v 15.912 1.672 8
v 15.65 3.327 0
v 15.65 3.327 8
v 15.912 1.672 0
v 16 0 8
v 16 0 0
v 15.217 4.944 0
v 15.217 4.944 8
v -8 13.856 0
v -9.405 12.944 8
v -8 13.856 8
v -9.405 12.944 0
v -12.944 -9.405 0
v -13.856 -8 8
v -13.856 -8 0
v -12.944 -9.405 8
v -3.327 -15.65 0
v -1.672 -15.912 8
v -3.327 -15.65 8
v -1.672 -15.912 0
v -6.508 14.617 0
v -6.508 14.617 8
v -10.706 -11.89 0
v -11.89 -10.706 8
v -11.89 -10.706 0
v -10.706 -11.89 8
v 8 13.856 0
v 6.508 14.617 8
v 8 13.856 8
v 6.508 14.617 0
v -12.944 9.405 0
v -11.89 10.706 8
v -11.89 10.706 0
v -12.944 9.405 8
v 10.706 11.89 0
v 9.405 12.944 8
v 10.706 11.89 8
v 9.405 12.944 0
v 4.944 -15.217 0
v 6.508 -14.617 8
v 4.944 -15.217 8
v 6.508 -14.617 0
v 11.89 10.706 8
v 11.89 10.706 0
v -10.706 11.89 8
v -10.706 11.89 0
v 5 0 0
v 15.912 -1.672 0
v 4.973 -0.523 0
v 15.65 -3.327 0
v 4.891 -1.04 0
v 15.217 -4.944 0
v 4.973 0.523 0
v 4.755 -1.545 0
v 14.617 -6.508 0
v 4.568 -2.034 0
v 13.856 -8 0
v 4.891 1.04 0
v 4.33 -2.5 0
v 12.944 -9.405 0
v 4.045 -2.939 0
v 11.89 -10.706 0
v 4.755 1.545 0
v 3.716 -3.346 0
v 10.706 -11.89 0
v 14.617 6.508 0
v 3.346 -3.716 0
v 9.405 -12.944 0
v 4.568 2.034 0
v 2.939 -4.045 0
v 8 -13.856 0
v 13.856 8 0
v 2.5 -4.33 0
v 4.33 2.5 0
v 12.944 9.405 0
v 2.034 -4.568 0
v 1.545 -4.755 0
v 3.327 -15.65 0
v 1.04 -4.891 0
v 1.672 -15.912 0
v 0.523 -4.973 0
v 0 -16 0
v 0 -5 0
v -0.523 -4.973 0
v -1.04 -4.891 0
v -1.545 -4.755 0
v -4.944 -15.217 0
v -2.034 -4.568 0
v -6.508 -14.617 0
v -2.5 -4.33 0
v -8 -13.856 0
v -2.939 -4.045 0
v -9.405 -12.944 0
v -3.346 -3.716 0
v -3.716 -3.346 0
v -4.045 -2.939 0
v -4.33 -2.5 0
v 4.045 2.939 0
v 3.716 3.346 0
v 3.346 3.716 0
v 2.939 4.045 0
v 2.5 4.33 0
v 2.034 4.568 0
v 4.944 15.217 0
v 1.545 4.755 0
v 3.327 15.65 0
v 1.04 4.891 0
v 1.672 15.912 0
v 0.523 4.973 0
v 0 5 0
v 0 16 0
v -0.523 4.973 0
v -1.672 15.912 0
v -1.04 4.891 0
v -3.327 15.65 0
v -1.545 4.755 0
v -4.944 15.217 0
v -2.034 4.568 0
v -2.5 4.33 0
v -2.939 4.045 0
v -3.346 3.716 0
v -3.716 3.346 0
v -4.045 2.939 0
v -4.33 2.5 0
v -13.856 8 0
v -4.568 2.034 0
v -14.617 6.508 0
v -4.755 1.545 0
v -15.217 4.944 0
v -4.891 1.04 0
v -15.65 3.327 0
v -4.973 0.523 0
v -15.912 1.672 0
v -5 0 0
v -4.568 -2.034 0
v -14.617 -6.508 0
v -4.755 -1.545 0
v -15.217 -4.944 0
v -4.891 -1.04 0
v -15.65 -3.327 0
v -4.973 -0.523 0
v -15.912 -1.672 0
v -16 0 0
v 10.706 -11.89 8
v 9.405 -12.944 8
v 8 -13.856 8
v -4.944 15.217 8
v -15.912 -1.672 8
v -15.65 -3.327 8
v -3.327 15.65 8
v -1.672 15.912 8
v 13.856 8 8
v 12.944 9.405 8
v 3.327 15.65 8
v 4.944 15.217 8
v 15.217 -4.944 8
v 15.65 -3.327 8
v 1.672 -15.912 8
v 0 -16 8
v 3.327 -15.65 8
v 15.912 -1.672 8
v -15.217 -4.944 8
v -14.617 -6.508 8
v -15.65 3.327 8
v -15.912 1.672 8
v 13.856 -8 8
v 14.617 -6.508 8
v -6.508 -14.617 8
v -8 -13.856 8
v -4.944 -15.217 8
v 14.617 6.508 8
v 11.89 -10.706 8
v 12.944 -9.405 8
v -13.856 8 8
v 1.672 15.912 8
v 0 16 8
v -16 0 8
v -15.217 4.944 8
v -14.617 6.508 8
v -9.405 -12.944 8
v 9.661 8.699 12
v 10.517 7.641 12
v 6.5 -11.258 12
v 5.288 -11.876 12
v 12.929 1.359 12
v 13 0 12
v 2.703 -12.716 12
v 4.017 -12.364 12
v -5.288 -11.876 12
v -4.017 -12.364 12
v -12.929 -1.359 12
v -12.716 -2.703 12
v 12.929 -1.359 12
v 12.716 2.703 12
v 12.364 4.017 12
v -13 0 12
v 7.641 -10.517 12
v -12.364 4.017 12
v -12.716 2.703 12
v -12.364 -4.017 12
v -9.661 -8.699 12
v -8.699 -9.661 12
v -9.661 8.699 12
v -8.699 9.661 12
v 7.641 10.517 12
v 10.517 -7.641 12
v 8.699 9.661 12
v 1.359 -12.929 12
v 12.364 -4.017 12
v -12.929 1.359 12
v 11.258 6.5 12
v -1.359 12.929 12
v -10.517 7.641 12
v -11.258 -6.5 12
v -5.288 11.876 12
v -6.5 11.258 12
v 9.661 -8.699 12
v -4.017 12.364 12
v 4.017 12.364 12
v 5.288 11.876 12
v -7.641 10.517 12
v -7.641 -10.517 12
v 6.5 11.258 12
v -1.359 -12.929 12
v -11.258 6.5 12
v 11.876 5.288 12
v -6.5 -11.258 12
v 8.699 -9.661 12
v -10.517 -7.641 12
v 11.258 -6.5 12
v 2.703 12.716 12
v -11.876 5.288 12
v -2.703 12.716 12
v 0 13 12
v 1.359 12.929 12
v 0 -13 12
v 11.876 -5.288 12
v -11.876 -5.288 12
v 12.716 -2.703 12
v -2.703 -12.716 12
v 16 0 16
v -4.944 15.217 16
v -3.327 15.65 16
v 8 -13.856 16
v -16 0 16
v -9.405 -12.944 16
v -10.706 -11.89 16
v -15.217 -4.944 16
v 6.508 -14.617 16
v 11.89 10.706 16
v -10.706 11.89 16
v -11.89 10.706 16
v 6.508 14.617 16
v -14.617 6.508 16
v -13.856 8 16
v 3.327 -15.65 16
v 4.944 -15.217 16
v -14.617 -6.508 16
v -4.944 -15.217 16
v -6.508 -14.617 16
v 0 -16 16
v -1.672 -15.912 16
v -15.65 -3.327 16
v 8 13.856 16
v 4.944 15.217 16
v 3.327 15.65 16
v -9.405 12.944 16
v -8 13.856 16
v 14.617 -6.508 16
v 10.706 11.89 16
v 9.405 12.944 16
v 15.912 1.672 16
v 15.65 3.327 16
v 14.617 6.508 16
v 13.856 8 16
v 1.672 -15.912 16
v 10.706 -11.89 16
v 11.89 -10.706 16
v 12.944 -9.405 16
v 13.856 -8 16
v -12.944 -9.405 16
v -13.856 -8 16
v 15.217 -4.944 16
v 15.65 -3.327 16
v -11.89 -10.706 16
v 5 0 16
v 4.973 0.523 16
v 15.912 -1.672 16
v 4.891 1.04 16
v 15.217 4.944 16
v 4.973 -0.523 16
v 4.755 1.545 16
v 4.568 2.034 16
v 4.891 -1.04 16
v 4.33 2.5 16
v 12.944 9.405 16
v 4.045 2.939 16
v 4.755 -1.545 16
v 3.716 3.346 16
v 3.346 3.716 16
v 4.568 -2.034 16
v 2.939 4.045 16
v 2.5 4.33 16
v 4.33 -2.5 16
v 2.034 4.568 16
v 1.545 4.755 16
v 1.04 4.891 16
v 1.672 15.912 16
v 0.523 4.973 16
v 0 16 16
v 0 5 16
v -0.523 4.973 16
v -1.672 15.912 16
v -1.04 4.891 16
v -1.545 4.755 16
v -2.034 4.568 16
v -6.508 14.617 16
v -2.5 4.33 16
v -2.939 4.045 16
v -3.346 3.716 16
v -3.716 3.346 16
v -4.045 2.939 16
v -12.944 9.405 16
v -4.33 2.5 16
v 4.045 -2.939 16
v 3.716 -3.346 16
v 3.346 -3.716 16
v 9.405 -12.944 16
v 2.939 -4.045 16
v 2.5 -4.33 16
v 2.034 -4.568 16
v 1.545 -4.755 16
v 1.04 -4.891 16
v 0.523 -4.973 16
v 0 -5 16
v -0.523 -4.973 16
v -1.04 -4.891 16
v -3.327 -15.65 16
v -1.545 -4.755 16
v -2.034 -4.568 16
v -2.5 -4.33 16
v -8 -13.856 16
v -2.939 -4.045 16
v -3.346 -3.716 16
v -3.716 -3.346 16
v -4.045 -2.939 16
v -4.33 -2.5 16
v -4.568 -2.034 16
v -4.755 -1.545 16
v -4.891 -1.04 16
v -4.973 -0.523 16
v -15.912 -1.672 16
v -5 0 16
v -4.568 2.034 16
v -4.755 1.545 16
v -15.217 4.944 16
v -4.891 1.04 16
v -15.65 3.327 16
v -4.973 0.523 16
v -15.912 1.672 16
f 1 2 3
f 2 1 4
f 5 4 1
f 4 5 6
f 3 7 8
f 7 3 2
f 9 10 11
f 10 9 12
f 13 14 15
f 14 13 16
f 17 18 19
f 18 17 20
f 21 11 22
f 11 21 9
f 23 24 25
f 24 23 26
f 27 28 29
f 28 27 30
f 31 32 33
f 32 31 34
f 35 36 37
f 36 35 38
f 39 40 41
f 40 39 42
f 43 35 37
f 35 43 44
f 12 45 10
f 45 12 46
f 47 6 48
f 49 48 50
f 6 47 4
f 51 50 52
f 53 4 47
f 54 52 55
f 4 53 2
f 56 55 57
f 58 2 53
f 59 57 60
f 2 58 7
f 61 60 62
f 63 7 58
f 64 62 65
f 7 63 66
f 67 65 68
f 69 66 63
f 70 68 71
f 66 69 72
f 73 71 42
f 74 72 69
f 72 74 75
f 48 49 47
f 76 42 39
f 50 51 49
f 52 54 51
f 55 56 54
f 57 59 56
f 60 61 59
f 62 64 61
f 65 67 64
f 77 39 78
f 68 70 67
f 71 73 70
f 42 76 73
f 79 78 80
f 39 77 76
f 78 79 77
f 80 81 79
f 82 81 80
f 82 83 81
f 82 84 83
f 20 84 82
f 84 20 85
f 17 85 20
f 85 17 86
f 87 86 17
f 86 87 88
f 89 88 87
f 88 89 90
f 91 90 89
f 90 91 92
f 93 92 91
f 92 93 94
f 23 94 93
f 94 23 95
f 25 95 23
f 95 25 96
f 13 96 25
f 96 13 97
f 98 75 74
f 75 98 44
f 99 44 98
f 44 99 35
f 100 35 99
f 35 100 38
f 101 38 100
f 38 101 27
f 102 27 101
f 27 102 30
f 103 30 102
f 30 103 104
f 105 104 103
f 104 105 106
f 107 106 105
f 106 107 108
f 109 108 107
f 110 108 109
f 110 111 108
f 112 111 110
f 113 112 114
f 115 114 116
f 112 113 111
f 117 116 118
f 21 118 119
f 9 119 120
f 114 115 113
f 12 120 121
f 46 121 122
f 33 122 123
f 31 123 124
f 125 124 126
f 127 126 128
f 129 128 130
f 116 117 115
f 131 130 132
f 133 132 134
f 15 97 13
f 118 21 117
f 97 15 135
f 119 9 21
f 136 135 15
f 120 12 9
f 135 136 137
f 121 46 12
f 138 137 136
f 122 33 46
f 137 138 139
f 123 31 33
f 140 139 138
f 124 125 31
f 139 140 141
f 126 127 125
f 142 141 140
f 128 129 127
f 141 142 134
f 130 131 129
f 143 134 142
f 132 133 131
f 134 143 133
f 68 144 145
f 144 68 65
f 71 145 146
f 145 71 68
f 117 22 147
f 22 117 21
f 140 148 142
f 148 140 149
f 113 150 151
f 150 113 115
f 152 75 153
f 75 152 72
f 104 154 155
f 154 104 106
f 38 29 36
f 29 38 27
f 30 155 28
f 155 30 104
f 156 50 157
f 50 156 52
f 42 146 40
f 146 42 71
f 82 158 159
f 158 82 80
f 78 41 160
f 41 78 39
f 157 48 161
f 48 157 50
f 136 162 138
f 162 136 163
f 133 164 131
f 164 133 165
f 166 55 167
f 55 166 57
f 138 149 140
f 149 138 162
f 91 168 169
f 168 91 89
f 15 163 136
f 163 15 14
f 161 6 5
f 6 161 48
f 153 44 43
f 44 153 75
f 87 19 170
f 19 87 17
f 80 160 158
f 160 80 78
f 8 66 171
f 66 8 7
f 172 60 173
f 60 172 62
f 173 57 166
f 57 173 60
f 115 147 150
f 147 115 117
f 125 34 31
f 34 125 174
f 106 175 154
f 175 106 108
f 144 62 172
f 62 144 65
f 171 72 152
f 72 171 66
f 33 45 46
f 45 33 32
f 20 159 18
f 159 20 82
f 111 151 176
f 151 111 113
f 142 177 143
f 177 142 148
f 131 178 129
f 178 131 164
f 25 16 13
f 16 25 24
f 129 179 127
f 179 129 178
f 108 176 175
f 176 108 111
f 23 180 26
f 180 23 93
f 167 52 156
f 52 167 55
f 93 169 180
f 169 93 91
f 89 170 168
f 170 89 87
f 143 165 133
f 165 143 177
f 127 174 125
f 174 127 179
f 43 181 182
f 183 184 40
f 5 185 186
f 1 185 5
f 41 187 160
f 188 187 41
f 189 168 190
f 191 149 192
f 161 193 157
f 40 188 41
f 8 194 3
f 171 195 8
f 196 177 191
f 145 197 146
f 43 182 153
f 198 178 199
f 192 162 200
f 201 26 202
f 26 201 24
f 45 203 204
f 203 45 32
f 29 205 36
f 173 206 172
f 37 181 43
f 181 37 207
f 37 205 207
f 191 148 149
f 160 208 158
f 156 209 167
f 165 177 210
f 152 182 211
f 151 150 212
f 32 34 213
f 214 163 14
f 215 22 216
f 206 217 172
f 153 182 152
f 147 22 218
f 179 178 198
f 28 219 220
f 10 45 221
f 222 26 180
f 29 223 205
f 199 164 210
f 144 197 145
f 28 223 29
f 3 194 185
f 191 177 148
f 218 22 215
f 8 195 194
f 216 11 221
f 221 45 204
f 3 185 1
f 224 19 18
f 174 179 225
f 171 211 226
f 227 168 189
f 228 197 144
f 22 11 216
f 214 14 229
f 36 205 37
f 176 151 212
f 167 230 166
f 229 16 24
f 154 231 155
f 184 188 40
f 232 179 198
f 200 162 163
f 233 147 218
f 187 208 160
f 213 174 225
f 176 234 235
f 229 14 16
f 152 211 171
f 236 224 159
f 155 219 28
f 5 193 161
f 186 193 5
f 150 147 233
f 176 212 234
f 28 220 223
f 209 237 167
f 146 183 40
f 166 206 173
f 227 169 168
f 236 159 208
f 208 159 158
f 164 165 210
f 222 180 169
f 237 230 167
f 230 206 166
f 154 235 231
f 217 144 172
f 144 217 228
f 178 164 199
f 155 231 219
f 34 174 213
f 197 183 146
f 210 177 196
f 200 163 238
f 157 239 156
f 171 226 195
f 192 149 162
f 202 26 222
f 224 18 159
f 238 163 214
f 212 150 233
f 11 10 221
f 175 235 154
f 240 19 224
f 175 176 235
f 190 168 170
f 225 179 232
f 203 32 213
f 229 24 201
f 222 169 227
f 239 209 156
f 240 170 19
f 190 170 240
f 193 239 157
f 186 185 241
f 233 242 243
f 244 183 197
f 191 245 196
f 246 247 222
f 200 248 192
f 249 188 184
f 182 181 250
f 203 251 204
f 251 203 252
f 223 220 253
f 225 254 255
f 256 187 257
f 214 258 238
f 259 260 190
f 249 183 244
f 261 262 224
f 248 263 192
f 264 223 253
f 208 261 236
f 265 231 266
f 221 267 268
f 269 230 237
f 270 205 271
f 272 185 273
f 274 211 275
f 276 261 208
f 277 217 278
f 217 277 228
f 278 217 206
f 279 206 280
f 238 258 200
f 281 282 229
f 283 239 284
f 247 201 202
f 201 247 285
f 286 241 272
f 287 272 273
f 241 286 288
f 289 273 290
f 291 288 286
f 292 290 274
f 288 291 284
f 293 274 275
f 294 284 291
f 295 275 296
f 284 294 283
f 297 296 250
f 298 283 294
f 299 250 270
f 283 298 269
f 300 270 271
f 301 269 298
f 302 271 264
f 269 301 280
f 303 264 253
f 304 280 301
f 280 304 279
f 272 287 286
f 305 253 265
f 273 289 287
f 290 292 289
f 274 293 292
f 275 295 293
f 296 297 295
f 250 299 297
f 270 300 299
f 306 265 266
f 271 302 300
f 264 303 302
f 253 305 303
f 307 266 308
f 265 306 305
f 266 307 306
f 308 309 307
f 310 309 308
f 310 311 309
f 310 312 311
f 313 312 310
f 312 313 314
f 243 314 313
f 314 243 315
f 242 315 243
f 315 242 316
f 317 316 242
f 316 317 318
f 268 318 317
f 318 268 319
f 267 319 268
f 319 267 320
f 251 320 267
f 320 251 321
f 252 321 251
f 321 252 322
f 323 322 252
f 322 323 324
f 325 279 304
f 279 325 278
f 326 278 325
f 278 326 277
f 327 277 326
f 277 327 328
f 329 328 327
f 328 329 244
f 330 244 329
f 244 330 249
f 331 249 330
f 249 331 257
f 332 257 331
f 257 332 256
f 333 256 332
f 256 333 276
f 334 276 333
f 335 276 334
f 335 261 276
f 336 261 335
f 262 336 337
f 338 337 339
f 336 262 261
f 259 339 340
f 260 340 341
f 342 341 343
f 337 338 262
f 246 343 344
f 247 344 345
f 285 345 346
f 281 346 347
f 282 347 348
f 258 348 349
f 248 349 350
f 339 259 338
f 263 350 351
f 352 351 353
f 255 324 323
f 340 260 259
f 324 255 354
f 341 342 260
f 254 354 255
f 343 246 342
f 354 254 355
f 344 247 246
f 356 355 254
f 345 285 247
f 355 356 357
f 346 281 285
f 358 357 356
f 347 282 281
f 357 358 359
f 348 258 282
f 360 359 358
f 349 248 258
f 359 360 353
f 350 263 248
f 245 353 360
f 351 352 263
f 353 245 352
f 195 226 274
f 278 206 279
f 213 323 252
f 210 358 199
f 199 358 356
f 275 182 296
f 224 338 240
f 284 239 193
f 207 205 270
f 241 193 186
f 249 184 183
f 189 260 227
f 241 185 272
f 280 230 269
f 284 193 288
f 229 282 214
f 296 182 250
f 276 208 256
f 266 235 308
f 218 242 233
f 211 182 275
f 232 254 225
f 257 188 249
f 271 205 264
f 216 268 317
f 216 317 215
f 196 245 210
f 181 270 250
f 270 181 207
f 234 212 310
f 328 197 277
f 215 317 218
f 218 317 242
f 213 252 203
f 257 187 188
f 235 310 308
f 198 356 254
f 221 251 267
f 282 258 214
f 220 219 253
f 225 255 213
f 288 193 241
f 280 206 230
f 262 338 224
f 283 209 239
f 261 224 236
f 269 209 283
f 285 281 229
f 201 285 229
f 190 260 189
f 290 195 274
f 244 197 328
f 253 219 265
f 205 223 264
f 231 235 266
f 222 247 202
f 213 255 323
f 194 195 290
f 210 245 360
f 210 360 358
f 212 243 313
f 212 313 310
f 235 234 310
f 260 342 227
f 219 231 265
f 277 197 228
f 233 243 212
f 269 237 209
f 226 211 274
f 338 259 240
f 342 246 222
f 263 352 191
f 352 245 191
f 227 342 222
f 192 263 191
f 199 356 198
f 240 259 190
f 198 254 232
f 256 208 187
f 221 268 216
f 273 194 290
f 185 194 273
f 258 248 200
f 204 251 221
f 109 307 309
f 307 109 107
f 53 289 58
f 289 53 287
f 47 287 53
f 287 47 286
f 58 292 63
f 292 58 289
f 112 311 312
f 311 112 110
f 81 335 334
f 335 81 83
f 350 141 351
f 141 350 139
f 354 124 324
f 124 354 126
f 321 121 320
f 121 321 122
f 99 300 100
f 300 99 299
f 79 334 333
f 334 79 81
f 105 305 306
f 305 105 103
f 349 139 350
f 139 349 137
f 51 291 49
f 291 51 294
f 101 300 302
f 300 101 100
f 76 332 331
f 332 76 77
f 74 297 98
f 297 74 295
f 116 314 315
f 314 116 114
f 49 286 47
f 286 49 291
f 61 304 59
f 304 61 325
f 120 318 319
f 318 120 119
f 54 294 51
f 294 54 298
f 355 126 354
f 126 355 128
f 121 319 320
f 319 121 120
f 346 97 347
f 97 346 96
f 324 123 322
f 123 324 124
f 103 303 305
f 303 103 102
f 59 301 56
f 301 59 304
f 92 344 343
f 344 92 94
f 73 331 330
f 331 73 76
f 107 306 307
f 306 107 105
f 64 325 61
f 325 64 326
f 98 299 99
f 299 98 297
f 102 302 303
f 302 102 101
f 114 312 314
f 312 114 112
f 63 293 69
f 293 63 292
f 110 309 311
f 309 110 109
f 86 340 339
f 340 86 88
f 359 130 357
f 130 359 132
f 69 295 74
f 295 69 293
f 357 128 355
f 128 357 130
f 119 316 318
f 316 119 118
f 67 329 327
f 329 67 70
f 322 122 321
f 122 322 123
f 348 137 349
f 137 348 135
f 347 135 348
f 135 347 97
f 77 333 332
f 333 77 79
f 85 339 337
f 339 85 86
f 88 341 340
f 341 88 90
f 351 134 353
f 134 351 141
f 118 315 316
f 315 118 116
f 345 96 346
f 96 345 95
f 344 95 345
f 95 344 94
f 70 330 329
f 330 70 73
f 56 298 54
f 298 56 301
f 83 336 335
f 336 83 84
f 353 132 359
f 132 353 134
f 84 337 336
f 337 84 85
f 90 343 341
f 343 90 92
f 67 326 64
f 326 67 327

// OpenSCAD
// V-groove guide wheel.
$fn = 60;
eps = 0.02;
bore_d = 10;
outer_d = 32;
width = 16;
groove_d = outer_d-6;
difference() {
    union() { cylinder(d=outer_d,h=width/2); translate([0,0,width/2]) cylinder(d1=outer_d,d2=groove_d,h=width/4); translate([0,0,3*width/4]) cylinder(d1=groove_d,d2=outer_d,h=width/4); }
    translate([0,0,-eps]) cylinder(d=bore_d,h=width+2*eps);
}
